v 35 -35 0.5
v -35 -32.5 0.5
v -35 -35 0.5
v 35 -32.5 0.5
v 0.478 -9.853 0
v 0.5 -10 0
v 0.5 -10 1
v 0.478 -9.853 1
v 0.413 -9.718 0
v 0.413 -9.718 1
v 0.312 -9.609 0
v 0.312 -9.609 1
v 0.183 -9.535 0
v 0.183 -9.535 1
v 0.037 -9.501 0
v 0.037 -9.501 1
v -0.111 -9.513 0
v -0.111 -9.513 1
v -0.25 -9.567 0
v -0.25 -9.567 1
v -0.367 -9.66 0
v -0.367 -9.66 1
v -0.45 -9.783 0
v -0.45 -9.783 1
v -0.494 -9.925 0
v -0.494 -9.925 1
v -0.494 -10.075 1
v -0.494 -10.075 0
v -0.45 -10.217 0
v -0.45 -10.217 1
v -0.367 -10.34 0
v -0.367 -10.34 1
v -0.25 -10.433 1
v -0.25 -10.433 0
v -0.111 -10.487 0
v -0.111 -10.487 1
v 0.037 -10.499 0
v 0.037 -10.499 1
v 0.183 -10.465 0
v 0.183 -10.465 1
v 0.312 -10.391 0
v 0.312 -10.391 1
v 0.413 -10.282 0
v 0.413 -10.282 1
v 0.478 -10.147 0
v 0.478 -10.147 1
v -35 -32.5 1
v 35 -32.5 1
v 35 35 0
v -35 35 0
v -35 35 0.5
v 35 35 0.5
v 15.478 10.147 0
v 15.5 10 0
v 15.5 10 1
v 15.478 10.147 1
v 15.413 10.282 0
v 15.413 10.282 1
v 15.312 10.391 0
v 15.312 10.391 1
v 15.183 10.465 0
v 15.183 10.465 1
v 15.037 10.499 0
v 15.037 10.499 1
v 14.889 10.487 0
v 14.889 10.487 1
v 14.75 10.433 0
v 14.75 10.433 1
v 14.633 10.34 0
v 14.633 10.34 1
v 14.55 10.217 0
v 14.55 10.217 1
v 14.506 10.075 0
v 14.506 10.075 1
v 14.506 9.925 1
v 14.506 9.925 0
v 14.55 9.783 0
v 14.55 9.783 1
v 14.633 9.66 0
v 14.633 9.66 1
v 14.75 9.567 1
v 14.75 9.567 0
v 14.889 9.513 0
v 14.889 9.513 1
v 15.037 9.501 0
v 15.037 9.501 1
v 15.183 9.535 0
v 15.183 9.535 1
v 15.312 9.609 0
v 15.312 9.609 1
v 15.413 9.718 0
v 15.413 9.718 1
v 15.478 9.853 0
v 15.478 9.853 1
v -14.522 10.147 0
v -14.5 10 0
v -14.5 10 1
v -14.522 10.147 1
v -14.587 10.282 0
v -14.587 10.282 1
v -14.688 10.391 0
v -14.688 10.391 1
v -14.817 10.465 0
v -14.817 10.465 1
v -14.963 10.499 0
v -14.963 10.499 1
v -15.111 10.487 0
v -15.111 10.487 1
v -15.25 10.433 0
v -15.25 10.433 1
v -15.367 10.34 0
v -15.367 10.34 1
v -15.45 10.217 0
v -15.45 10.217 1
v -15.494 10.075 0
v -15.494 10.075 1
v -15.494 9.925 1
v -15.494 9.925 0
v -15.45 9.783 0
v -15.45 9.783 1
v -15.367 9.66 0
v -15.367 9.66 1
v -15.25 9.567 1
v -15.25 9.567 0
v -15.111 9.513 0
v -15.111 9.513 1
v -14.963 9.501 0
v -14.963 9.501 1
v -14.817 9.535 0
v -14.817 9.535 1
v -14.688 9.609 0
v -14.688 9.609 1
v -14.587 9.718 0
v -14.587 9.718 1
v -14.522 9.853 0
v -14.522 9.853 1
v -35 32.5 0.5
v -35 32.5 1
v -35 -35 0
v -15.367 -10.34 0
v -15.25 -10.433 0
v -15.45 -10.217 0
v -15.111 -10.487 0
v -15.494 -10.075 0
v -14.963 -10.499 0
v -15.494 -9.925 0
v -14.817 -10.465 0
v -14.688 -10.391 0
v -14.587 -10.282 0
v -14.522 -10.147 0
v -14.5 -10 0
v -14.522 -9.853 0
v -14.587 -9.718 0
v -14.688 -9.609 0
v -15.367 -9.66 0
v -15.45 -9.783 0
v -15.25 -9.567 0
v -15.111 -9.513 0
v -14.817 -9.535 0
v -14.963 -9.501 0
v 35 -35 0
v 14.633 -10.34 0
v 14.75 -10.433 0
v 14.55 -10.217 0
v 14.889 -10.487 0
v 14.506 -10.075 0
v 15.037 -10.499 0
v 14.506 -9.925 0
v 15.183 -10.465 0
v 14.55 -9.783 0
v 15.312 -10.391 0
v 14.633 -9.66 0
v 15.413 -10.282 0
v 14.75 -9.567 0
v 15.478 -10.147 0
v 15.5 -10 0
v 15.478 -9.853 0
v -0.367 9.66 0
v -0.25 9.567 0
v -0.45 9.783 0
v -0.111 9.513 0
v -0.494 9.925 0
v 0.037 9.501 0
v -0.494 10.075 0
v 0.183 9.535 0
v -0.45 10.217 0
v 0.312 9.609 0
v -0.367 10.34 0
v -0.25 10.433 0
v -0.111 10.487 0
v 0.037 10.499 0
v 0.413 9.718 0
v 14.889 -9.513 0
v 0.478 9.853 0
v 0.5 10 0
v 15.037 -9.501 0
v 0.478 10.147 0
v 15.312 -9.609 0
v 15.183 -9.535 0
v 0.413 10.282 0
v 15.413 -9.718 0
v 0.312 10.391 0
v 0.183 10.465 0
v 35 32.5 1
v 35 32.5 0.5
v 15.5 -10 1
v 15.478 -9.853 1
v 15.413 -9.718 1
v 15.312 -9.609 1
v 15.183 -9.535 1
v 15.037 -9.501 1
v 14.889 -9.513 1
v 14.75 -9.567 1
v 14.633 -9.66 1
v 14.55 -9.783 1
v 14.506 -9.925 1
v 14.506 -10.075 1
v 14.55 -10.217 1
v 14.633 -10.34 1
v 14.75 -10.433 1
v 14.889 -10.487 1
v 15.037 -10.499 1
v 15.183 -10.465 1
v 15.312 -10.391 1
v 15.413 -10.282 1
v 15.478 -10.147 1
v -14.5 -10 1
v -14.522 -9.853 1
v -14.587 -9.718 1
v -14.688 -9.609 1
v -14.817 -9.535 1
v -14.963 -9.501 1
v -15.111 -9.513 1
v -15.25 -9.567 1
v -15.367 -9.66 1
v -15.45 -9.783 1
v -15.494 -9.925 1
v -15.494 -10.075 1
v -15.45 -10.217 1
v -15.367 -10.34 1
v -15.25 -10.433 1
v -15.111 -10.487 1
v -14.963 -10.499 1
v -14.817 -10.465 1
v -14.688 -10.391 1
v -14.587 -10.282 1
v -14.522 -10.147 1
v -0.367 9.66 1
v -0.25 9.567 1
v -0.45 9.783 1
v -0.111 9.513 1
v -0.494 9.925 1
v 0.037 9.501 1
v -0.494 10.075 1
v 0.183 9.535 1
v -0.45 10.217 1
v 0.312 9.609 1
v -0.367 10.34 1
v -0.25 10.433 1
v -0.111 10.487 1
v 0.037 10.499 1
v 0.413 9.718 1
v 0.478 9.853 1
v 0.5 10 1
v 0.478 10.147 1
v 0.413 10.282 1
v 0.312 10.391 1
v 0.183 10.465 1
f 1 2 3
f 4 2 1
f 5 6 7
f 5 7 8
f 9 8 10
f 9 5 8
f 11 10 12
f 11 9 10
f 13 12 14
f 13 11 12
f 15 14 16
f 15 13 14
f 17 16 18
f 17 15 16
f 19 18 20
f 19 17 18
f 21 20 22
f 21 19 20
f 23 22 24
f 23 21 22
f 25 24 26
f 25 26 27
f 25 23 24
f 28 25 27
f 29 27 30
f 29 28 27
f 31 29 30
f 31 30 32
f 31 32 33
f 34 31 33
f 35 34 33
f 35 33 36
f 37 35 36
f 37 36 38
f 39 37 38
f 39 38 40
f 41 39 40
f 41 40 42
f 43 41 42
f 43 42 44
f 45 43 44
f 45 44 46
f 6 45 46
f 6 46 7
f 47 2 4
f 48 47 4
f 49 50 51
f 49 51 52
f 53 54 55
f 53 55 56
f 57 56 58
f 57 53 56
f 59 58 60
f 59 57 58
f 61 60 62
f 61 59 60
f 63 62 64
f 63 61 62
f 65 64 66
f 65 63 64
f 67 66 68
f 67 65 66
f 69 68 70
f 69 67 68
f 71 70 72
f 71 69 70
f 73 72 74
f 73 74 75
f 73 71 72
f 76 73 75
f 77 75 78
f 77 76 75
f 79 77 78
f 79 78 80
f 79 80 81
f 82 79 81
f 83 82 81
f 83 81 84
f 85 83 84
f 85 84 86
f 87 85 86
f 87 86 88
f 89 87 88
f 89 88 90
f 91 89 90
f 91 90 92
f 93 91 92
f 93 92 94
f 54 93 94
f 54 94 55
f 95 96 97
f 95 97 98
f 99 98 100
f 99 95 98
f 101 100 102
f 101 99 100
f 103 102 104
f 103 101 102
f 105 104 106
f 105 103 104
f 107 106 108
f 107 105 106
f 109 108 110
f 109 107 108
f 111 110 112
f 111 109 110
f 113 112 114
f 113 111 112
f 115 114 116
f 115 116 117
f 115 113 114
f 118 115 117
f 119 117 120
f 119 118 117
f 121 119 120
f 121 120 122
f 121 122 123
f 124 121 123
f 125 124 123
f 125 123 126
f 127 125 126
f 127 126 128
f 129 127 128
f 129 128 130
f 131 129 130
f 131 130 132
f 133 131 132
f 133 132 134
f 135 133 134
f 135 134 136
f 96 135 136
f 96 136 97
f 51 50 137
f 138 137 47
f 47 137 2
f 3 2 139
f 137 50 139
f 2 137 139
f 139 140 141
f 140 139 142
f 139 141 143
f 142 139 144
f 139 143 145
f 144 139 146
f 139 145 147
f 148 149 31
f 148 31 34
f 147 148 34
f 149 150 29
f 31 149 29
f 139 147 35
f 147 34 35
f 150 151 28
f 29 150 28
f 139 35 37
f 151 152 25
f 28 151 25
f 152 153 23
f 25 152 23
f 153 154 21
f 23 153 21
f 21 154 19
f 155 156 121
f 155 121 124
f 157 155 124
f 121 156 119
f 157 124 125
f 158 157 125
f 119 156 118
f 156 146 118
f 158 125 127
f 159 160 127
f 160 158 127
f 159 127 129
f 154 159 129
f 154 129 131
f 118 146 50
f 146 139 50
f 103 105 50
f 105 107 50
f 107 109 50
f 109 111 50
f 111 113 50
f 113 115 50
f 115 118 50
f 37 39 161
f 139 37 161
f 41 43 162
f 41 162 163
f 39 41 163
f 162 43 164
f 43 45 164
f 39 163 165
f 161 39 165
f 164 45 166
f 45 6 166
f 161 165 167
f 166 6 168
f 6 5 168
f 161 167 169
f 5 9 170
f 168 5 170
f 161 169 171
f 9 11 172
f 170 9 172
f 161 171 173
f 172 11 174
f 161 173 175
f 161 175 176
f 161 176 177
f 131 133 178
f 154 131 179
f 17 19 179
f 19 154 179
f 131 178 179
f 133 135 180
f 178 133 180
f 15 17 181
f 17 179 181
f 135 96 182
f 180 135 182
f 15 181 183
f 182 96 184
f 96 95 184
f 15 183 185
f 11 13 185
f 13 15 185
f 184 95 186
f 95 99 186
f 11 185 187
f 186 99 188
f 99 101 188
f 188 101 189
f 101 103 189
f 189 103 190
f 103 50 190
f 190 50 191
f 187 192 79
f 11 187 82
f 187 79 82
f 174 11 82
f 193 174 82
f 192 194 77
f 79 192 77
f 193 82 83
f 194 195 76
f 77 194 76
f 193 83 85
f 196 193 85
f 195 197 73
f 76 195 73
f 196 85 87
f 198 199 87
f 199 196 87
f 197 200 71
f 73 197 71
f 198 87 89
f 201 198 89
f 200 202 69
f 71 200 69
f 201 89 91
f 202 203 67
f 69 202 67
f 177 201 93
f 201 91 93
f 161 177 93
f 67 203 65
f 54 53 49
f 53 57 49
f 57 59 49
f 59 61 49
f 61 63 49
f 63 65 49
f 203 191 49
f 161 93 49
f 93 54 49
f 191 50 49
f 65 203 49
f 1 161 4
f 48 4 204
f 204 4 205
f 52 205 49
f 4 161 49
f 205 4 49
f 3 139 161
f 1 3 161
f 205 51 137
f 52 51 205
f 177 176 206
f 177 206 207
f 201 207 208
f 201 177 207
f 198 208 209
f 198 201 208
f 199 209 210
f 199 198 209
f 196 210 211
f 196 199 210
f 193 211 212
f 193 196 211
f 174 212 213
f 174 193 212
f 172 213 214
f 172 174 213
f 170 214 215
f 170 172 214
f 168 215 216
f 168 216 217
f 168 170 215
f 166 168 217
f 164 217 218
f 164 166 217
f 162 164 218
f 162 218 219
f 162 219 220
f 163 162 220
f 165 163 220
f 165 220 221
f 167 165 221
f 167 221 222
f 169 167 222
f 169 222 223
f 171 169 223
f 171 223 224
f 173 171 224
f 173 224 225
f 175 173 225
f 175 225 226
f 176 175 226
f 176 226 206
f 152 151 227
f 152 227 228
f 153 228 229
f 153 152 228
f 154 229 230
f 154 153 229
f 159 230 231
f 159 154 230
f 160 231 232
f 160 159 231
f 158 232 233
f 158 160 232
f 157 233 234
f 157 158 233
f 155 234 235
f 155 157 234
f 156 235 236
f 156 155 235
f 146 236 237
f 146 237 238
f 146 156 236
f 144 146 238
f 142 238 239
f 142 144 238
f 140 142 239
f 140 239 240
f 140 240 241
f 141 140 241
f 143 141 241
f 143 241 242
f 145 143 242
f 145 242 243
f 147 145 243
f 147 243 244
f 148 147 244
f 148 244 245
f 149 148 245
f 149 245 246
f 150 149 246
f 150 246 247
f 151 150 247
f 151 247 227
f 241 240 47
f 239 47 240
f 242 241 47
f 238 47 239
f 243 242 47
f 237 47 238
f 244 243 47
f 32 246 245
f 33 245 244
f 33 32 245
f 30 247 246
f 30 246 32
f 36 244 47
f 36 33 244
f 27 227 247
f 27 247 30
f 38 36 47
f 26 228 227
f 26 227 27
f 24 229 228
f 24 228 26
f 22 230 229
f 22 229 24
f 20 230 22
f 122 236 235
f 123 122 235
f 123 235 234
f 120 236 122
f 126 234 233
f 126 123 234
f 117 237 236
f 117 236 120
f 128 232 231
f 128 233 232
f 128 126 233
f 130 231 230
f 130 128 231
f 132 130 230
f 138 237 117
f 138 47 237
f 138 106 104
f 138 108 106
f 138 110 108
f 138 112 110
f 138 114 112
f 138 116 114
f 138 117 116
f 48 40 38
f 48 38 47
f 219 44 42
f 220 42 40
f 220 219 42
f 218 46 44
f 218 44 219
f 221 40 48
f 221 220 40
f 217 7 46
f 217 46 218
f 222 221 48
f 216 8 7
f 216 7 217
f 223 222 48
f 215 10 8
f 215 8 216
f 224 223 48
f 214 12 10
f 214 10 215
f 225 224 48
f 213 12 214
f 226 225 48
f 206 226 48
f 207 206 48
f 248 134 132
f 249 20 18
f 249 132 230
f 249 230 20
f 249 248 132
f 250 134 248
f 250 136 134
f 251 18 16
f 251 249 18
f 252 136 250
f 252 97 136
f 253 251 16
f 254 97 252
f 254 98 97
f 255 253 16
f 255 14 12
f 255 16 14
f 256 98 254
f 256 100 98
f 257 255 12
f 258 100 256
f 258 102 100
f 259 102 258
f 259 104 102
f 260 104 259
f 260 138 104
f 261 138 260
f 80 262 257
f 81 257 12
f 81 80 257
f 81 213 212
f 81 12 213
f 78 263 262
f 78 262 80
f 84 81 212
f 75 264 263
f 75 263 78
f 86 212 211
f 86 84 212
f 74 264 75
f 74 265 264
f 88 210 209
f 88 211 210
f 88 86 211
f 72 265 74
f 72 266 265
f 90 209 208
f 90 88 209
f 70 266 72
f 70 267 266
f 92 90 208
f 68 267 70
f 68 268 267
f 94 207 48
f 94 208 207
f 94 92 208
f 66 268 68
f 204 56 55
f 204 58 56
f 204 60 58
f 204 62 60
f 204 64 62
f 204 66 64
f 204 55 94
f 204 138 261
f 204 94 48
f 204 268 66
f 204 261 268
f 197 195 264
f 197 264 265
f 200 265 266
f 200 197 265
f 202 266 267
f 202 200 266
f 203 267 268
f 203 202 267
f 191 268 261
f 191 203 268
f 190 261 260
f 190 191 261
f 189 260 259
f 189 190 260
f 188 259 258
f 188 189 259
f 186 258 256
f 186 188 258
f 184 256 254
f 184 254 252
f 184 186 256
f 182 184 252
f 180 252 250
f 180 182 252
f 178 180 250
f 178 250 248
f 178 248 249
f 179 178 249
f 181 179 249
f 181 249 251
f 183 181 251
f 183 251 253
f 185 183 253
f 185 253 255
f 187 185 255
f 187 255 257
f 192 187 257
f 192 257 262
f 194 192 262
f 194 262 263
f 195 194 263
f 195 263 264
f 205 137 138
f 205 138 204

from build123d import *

# Parameters (mm, degrees)
F0_W     = 70
F0_H     = 65
F0_R     = 0.5
F1_DEPTH = 1
F0_H_2   = 2.5
F2_DEPTH = 0.5


with BuildPart() as f1:
    # F0 (on Top) → F1 (new body)
    with BuildSketch(Plane.XY):
        Rectangle(F0_W, F0_H)
        with Locations((-15, -10)):
            Circle(F0_R, mode=Mode.SUBTRACT)
        with Locations((0, -10)):
            Circle(F0_R, mode=Mode.SUBTRACT)
        with Locations((15, -10)):
            Circle(F0_R, mode=Mode.SUBTRACT)
        with Locations((-15, 10)):
            Circle(F0_R, mode=Mode.SUBTRACT)
        with Locations((0, 10)):
            Circle(F0_R, mode=Mode.SUBTRACT)
        with Locations((15, 10)):
            Circle(F0_R, mode=Mode.SUBTRACT)
    extrude(amount=F1_DEPTH)

    # F0 (on Top) → F2 (join)
    with BuildSketch(Plane.XY):
        Rectangle(F0_W, F0_H)
        with Locations((-15, -10)):
            Circle(F0_R, mode=Mode.SUBTRACT)
        with Locations((0, -10)):
            Circle(F0_R, mode=Mode.SUBTRACT)
        with Locations((15, -10)):
            Circle(F0_R, mode=Mode.SUBTRACT)
        with Locations((-15, 10)):
            Circle(F0_R, mode=Mode.SUBTRACT)
        with Locations((0, 10)):
            Circle(F0_R, mode=Mode.SUBTRACT)
        with Locations((15, 10)):
            Circle(F0_R, mode=Mode.SUBTRACT)
        with Locations((0, 33.75)):
            Rectangle(F0_W, F0_H_2)
        with Locations((0, -33.75)):
            Rectangle(F0_W, F0_H_2)
    extrude(amount=F2_DEPTH)


solid = f1.part
